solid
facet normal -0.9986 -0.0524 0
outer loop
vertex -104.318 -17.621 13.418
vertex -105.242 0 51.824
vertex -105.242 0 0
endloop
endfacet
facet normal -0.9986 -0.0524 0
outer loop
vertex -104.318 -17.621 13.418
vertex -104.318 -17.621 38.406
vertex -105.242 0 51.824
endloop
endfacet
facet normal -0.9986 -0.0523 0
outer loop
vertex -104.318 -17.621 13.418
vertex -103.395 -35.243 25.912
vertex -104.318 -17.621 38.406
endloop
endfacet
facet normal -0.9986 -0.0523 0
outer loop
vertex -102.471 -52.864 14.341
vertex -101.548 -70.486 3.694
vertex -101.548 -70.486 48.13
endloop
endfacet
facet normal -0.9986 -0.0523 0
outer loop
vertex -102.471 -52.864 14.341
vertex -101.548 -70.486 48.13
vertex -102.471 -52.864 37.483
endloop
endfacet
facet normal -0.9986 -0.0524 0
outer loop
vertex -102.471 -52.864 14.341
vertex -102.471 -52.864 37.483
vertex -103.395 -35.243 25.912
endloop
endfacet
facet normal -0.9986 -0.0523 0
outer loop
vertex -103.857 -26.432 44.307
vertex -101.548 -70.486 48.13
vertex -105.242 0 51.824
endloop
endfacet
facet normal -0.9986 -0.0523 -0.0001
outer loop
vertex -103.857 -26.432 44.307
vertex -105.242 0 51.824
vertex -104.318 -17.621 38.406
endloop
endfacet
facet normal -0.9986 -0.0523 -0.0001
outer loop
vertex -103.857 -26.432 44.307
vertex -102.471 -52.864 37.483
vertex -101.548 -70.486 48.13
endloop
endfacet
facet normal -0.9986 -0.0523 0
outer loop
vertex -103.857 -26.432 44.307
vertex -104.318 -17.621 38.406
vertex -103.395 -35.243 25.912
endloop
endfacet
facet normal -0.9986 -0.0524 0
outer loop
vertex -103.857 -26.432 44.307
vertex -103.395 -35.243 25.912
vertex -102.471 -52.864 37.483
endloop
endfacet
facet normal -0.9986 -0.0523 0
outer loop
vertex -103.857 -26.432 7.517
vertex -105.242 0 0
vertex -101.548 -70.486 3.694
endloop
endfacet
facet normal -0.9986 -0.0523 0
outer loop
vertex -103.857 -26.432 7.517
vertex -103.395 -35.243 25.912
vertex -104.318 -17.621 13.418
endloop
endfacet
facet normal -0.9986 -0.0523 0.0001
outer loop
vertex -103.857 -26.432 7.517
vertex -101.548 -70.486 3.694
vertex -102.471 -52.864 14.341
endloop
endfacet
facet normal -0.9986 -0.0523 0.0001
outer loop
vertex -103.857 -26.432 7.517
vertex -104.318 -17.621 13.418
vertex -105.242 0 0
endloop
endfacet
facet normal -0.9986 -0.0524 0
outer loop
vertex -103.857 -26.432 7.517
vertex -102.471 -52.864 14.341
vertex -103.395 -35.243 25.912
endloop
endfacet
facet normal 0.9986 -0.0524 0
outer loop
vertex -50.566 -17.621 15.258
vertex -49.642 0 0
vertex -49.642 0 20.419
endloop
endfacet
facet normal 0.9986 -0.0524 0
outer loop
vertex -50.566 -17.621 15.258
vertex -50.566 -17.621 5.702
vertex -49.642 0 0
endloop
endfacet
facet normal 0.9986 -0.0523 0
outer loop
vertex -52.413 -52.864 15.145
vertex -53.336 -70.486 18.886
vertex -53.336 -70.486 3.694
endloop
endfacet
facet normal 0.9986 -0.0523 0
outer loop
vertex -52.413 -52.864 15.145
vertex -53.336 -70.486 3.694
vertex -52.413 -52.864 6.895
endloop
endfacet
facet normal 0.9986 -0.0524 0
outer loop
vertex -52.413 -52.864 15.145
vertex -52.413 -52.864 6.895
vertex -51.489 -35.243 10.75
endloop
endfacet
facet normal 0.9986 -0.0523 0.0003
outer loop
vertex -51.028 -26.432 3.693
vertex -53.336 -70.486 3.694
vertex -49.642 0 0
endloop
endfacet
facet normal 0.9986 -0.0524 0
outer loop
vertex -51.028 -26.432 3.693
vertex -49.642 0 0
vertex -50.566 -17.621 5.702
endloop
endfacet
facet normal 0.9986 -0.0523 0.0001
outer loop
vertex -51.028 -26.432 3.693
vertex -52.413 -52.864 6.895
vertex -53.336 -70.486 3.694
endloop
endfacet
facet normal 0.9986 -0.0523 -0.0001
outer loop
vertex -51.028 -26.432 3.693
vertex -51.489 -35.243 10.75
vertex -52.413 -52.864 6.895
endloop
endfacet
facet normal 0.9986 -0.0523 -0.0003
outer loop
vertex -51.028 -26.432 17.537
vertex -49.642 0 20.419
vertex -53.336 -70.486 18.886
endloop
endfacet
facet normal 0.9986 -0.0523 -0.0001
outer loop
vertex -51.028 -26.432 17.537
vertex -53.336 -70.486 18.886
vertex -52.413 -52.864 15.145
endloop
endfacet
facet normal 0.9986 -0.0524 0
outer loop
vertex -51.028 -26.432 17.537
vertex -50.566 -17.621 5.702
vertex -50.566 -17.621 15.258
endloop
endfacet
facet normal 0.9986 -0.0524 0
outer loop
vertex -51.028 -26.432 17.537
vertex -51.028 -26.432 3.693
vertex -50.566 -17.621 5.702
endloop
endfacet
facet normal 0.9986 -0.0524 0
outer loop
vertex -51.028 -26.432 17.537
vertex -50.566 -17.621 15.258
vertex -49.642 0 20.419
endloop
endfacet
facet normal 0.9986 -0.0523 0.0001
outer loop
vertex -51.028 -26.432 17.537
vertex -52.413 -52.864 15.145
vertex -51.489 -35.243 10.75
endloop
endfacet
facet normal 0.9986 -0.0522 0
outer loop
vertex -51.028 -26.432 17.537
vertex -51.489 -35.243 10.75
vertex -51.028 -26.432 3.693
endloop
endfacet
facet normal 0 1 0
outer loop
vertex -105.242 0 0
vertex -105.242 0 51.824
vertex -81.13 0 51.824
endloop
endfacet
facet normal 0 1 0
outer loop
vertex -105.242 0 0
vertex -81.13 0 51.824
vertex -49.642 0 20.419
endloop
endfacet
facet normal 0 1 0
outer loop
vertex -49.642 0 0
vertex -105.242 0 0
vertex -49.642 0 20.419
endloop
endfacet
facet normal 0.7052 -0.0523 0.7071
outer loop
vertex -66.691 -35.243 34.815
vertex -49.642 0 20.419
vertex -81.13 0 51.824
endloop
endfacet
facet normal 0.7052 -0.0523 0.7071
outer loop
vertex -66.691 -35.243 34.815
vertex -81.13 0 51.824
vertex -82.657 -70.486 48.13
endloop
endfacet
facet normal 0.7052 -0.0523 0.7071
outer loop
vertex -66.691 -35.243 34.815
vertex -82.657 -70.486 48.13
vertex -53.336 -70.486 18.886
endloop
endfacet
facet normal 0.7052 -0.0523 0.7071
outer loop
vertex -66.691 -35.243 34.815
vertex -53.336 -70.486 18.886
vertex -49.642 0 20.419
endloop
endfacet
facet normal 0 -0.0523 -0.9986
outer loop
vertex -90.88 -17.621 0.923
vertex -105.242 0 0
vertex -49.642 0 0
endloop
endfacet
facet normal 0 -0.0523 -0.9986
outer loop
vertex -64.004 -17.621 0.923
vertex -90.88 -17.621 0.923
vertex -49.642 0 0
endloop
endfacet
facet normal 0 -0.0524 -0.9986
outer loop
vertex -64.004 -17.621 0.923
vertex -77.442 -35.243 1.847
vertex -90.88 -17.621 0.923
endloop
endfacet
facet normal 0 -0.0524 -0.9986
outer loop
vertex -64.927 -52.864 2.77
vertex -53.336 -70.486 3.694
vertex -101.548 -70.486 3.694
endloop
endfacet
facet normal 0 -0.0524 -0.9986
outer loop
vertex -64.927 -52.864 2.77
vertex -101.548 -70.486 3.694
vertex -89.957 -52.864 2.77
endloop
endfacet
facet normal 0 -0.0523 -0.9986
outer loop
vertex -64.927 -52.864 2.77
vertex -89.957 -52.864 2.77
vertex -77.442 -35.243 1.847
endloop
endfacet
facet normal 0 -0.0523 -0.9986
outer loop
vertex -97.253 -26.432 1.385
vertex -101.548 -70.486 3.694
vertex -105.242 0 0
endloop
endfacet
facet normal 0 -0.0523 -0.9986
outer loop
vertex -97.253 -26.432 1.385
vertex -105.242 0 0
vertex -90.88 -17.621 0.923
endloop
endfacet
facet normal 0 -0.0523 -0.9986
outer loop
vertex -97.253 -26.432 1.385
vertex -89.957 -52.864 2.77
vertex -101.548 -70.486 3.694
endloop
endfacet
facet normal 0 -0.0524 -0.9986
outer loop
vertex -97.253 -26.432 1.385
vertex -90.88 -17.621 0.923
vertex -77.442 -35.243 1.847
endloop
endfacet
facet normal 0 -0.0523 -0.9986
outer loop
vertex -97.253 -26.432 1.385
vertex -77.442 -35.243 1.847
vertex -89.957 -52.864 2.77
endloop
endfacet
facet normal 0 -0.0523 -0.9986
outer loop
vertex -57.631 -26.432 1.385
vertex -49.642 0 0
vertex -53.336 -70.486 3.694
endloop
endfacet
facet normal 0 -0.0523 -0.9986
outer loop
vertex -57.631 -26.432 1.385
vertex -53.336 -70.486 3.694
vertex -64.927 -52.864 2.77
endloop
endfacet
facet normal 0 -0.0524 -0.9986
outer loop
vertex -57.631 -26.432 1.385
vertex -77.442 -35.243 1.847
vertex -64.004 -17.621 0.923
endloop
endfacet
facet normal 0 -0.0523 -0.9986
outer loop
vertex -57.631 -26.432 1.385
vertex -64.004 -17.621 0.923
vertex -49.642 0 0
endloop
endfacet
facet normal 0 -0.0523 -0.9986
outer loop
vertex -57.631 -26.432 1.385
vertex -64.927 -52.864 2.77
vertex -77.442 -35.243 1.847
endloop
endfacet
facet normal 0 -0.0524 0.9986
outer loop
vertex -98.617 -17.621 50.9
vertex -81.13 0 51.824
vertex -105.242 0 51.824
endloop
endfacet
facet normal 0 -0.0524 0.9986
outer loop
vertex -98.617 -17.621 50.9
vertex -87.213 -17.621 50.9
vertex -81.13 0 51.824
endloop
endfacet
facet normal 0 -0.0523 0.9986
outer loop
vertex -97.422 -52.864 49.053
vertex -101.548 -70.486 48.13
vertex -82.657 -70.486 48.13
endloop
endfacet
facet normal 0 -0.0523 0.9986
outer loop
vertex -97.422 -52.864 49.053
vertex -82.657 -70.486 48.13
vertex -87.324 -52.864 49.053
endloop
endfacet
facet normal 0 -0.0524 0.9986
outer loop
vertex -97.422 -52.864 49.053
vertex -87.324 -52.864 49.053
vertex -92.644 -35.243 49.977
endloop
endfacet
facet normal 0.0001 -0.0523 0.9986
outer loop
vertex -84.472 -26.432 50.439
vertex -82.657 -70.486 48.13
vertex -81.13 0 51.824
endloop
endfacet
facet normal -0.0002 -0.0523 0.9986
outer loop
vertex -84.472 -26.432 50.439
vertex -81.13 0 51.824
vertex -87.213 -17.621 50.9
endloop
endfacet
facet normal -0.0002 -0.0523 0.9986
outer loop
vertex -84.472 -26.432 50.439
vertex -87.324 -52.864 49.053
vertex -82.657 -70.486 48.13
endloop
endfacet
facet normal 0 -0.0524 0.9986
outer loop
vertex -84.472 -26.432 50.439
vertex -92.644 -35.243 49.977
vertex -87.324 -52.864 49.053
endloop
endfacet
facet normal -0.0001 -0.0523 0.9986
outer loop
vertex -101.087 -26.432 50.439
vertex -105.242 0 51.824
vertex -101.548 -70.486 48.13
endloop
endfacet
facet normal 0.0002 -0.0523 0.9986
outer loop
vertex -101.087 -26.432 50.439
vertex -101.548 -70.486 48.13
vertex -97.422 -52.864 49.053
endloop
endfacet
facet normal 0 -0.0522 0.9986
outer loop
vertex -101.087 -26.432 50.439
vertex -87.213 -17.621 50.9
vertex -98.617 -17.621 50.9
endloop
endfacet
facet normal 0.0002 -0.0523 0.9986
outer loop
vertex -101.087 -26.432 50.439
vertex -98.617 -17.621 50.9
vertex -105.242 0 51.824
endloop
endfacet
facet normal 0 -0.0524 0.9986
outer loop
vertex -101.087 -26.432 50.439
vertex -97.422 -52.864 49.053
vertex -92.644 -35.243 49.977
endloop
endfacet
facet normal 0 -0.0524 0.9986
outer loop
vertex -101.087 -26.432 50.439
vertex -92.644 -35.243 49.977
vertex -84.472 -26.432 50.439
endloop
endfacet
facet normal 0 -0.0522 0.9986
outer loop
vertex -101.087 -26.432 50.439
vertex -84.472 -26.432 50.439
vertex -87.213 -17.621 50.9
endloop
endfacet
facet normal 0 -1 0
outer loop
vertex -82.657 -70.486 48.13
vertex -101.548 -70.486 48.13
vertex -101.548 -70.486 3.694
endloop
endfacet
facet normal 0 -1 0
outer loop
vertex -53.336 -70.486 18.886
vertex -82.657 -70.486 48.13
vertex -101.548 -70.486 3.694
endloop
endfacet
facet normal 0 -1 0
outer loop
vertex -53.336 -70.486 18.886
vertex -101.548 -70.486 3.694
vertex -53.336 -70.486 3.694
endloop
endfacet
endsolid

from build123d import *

# Parameters (mm, degrees)
F1_DEPTH = 70.48556
F1_TAPER = 3


with BuildPart() as f1:
    # F0 (on Front) → F1 (new body)
    with BuildSketch(Plane.XZ):
        Polygon((-105.2418574691, 51.8238693476), (-105.2418574691, 0), (-49.6423840523, 0), (-49.6423840523, 20.419145003), (-81.1298340559, 51.8238693476), align=None)
    extrude(amount=F1_DEPTH, taper=F1_TAPER)


solid = f1.part
